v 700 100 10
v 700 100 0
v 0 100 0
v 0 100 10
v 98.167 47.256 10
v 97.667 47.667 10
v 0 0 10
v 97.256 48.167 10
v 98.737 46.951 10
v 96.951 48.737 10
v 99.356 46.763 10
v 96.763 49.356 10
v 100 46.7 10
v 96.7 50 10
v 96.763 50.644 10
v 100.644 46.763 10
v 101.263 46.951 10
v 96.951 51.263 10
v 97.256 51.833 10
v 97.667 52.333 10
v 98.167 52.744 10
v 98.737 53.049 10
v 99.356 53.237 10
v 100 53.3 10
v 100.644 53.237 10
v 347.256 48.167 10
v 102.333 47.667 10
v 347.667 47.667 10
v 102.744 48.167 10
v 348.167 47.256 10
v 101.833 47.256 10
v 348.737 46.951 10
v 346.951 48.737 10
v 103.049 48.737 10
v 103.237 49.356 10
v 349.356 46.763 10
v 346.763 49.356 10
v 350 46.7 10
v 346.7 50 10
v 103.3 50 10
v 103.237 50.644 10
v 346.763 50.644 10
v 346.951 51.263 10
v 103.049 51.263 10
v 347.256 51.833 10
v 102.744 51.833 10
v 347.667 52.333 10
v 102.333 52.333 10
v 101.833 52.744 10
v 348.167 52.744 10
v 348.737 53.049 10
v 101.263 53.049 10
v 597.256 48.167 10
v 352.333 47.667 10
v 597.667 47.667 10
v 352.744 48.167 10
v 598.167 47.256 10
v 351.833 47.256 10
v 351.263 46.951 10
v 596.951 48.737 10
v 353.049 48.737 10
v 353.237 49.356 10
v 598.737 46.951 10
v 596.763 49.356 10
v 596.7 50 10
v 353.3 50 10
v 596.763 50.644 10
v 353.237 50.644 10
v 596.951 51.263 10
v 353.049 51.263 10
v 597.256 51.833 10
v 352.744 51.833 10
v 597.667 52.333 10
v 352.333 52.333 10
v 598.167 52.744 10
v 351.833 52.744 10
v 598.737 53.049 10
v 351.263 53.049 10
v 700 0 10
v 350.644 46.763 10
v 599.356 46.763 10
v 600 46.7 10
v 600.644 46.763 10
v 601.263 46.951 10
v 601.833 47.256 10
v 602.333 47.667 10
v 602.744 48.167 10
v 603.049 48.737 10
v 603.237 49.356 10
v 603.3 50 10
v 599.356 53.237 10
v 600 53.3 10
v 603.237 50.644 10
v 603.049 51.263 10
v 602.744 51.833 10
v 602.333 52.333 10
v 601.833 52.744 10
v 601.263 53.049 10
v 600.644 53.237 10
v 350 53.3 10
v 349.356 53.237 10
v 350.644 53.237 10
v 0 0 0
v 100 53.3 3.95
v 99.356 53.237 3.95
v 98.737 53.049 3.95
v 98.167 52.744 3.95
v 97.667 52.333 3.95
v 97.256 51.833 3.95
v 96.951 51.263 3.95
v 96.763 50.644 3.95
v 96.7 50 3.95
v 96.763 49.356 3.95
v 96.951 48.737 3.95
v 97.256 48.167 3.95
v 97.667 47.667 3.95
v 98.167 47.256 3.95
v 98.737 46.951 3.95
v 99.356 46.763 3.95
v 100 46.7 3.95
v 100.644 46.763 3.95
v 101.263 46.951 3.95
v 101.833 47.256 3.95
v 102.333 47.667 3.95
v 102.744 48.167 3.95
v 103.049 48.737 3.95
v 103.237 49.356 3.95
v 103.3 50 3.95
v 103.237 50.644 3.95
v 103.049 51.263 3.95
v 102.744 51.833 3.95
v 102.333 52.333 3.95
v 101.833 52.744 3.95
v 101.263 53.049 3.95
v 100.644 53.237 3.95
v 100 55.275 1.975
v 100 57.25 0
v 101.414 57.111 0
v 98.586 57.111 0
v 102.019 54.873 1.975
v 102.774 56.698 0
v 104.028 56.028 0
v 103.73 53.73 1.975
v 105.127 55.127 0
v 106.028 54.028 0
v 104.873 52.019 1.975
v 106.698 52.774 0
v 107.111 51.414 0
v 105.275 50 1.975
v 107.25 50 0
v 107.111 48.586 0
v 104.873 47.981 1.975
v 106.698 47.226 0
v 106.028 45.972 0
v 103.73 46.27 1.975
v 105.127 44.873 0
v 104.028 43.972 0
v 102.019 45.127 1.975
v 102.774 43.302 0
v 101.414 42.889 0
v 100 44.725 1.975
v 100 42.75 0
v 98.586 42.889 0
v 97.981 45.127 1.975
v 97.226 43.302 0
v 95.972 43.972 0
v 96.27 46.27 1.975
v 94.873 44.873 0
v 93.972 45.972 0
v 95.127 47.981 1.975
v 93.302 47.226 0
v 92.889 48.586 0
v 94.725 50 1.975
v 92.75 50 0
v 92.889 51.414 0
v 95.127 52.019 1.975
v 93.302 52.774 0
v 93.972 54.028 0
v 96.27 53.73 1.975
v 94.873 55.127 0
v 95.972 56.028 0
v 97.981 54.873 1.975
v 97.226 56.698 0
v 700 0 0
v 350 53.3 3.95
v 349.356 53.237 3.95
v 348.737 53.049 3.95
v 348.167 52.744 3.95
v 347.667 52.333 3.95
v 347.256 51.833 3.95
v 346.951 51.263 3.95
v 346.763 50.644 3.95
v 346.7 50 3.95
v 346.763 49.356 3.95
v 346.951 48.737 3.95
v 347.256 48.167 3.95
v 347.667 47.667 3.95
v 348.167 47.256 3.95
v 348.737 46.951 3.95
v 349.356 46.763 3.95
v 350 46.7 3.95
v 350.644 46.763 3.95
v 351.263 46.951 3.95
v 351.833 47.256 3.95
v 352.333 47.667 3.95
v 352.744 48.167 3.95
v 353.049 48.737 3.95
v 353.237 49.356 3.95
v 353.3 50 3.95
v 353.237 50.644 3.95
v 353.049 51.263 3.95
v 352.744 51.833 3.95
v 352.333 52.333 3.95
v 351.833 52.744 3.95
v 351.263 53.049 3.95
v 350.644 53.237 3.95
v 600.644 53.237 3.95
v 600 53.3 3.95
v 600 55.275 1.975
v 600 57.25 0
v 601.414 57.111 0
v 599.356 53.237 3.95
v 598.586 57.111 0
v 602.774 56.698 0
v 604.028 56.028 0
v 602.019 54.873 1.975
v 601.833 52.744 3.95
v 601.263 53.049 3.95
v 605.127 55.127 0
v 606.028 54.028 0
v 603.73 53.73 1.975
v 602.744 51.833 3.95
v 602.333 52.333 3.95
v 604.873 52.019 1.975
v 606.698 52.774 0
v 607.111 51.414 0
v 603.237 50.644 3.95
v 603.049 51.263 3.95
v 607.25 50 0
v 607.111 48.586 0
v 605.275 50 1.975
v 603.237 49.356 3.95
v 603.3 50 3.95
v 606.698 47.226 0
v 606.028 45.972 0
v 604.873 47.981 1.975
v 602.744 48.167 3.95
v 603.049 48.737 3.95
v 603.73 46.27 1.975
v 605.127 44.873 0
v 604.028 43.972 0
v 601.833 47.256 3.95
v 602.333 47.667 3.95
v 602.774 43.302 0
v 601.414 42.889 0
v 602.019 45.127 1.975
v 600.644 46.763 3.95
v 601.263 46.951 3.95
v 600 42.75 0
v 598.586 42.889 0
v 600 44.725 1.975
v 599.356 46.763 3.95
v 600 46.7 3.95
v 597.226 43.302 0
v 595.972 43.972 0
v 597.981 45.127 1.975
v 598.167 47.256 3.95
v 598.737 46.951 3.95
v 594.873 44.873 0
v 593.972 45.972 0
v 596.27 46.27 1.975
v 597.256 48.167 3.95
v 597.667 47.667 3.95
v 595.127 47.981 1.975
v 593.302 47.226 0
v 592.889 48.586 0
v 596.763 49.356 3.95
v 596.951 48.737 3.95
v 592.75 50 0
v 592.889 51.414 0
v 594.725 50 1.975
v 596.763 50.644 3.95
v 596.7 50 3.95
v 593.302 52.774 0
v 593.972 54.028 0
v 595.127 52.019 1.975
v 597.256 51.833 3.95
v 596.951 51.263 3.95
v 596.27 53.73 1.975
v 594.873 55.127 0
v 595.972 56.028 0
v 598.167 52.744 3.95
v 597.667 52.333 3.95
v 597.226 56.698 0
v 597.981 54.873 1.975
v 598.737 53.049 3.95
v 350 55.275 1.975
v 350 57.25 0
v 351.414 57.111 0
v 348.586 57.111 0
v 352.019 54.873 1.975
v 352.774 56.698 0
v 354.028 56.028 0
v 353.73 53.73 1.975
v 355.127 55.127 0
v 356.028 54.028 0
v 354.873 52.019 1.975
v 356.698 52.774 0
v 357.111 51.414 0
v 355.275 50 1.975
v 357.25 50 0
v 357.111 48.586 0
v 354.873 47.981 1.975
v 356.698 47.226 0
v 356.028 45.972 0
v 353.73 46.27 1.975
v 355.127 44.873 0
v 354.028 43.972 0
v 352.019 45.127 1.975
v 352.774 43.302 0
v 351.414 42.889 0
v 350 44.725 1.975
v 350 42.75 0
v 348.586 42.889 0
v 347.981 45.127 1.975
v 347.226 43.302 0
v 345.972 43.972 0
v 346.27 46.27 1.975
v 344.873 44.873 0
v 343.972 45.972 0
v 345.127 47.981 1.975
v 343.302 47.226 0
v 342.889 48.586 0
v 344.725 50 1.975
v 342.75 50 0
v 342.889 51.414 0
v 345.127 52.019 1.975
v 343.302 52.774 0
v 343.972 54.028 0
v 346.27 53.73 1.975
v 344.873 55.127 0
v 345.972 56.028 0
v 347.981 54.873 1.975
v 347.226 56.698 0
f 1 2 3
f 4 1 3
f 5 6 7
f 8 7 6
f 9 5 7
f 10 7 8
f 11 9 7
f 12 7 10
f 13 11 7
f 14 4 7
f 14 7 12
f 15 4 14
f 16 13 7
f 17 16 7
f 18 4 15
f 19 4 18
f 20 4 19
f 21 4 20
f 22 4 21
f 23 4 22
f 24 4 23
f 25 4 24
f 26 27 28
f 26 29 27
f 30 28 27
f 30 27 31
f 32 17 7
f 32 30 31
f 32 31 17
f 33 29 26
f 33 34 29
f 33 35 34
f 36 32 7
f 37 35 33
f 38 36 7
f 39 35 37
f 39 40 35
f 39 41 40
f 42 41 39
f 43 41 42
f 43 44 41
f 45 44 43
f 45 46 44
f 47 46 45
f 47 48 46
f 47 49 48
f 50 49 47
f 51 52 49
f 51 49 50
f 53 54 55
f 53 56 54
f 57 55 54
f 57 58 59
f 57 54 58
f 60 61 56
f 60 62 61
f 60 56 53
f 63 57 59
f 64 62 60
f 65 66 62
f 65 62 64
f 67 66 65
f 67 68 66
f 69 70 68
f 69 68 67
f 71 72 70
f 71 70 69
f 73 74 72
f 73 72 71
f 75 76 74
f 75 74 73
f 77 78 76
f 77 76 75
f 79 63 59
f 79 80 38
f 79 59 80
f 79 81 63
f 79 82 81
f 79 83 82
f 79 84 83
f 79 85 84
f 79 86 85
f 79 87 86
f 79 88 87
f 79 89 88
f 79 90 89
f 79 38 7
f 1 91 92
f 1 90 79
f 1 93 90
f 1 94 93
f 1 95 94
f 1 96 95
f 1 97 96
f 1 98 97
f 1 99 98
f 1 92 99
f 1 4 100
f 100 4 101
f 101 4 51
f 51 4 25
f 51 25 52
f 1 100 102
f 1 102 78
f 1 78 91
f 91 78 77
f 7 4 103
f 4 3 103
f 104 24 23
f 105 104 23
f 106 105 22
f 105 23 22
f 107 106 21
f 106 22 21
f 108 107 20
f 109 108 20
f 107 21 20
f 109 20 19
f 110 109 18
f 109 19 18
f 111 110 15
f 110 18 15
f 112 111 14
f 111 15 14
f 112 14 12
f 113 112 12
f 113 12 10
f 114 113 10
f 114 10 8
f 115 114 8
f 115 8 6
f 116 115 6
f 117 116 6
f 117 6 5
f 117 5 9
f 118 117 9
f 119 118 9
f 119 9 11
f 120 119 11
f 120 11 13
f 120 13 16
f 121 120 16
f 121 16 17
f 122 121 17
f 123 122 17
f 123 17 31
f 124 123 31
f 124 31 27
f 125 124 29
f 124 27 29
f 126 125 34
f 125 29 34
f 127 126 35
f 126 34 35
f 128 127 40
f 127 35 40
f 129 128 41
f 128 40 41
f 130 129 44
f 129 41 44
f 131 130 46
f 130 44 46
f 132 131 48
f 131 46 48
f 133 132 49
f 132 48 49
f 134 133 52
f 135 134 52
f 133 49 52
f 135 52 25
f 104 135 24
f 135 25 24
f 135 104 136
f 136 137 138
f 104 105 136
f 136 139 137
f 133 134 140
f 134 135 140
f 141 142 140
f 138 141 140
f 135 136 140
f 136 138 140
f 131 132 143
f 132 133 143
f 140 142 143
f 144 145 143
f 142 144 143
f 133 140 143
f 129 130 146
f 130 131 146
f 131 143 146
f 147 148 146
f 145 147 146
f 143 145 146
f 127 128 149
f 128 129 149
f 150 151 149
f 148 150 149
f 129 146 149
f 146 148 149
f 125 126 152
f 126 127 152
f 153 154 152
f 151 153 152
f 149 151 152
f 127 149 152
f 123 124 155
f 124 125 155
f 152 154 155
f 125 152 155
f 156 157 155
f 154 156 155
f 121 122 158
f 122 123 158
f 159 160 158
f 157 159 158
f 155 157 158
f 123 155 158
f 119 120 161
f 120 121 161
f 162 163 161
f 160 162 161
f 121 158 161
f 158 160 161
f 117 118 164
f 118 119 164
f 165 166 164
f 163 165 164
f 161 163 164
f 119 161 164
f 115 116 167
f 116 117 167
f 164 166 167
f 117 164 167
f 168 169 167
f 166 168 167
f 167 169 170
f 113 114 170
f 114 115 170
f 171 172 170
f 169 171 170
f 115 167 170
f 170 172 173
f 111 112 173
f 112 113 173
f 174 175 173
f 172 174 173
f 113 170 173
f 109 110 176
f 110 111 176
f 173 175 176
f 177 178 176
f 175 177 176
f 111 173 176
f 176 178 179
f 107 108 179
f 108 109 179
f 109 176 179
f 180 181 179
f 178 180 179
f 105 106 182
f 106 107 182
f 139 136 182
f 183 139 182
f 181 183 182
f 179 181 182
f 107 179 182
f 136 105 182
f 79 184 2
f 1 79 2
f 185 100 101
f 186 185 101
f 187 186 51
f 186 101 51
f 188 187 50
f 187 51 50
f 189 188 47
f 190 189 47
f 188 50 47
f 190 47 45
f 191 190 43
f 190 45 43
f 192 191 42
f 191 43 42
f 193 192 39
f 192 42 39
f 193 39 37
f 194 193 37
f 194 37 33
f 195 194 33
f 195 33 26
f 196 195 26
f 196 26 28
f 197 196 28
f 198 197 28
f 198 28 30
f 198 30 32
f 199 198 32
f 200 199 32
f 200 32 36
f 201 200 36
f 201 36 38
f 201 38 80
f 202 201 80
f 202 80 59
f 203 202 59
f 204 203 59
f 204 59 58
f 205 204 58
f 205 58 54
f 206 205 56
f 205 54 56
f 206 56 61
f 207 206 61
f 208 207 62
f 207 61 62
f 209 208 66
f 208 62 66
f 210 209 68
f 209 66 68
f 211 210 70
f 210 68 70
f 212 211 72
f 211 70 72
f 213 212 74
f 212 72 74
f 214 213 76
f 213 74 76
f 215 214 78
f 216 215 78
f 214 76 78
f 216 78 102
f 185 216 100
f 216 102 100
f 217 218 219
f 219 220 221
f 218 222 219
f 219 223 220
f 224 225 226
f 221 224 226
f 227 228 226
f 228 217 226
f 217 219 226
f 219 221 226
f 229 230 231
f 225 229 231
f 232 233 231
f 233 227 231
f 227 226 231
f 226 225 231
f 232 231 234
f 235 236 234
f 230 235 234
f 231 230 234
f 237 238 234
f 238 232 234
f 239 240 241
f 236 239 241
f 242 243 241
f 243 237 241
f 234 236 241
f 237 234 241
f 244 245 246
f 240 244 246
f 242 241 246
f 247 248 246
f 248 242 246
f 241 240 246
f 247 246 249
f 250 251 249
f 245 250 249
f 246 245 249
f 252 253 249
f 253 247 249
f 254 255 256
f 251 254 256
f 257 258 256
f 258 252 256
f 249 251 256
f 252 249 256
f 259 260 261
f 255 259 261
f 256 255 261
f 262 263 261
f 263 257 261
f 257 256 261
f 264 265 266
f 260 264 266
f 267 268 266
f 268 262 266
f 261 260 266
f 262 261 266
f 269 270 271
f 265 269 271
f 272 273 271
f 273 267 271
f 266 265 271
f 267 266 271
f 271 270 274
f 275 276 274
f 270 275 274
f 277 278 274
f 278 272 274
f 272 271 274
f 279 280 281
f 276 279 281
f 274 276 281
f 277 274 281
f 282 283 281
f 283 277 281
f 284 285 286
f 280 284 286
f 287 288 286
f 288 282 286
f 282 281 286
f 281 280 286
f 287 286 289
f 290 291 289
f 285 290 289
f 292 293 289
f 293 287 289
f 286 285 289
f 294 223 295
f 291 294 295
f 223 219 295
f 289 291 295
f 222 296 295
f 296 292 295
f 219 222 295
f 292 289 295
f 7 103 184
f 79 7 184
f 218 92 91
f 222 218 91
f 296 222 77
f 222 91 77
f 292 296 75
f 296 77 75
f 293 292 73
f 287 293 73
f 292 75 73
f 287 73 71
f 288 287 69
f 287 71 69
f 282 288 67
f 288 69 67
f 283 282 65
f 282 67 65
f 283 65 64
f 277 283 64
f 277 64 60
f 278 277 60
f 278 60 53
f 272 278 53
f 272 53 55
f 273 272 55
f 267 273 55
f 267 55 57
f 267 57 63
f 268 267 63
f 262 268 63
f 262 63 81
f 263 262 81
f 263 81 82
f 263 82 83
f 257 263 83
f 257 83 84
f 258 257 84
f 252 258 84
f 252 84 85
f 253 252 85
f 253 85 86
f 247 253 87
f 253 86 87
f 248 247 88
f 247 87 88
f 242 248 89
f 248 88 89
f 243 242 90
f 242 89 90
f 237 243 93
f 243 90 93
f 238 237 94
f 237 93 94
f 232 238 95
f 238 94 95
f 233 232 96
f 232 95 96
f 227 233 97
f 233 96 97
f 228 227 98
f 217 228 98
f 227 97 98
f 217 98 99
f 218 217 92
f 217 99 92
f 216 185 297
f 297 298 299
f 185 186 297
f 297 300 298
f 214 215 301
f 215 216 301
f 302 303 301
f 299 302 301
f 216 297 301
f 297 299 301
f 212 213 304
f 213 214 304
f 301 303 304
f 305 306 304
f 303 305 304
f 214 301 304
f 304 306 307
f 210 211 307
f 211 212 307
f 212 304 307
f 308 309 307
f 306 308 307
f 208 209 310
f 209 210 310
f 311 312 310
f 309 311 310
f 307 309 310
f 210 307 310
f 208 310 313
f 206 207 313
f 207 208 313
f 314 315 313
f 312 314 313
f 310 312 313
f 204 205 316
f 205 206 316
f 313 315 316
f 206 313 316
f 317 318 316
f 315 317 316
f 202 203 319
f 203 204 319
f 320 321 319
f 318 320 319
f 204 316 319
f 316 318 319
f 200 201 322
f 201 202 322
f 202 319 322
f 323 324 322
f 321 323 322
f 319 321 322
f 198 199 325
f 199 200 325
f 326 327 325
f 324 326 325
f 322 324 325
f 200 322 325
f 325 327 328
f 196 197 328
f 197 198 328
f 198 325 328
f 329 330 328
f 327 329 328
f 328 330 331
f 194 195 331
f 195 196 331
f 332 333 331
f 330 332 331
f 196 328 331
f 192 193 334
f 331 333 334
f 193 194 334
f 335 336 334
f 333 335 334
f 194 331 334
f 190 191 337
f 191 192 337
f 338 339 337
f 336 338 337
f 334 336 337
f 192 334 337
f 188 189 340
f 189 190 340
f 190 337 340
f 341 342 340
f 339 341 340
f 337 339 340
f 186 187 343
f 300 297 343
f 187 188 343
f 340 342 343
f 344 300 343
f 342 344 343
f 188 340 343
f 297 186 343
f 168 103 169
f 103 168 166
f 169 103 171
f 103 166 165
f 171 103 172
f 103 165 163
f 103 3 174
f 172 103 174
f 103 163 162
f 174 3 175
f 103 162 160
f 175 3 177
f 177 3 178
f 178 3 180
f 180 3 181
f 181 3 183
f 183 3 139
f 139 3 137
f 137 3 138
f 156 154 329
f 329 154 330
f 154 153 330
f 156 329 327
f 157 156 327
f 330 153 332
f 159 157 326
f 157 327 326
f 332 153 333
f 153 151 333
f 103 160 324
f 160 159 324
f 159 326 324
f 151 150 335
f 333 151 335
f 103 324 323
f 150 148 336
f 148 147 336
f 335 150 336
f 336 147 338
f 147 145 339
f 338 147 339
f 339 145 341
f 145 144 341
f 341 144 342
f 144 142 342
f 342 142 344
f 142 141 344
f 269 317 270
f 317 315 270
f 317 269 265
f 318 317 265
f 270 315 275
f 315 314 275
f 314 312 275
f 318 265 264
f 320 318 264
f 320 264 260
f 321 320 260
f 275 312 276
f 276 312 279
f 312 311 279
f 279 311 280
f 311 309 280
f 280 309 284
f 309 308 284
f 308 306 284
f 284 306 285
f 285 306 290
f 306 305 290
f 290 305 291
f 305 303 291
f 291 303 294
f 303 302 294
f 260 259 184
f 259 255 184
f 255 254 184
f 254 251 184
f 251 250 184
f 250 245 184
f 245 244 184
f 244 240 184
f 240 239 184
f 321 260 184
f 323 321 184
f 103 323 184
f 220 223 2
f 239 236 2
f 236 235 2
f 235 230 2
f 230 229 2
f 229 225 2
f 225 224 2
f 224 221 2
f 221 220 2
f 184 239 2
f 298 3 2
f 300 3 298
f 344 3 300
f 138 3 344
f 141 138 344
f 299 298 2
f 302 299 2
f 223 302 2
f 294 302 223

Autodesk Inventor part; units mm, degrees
ref_plane "YZ Plane" through (0, 0, 0) normal (1, 0, 0) x (0, 1, 0)
ref_plane "XZ Plane" through (0, 0, 0) normal (0, 1, 0) x (-1, 0, 0)
ref_plane "XY Plane" through (0, 0, 0) normal (0, 0, 1) x (1, 0, 0)
sketch "Skizze1" plane through (0, 0, 0) normal (0, 0, 1) x (1, 0, 0)
  line L0 (0, 0) -> (700, 0)
  line L1 (700, 0) -> (700, 100)
  line L2 (700, 100) -> (0, 100)
  line L3 (0, 100) -> (0, 0)
  dimension "d4" = 700
  dimension "d5" = 100
extrude "Extrusion1" add sketch "Skizze1" along normal blind 10
sketch "Skizze2" plane through (0, 0, 0) normal (0, 0, -1) x (-1, 0, 0)
  line L0 (736.2089, -6.1125) -> (736.2089, 106.1125)
  line L1 (-100, 50) -> (-600, 50) construction
  line L2 (0, 0) -> (-700, 0) projected
  line L3 (0, 100) -> (0, 0) projected
  point P0 (-350, 50)
  point P1 (736.2089, 50)
  point P2 (-350, 0)
  point P3 (-350, 0)
  point P4 (-350, 0)
  point P5 (0, 50)
  dimension "d6" = 500
hole "Bohrung1" at (100, 50, 0) at (350, 50, 0) at (600, 50, 0) direction (0, 0, 1) diameter 6.6 end through all countersink diameter 14.5 countersink angle 90 clearance for "Innensechskant-Senkkopfschraube DIN EN ISO 10642" size "M6" standard "DIN"
properties part number "Lid_SidePanel" material "Polycarbonat, klar"
